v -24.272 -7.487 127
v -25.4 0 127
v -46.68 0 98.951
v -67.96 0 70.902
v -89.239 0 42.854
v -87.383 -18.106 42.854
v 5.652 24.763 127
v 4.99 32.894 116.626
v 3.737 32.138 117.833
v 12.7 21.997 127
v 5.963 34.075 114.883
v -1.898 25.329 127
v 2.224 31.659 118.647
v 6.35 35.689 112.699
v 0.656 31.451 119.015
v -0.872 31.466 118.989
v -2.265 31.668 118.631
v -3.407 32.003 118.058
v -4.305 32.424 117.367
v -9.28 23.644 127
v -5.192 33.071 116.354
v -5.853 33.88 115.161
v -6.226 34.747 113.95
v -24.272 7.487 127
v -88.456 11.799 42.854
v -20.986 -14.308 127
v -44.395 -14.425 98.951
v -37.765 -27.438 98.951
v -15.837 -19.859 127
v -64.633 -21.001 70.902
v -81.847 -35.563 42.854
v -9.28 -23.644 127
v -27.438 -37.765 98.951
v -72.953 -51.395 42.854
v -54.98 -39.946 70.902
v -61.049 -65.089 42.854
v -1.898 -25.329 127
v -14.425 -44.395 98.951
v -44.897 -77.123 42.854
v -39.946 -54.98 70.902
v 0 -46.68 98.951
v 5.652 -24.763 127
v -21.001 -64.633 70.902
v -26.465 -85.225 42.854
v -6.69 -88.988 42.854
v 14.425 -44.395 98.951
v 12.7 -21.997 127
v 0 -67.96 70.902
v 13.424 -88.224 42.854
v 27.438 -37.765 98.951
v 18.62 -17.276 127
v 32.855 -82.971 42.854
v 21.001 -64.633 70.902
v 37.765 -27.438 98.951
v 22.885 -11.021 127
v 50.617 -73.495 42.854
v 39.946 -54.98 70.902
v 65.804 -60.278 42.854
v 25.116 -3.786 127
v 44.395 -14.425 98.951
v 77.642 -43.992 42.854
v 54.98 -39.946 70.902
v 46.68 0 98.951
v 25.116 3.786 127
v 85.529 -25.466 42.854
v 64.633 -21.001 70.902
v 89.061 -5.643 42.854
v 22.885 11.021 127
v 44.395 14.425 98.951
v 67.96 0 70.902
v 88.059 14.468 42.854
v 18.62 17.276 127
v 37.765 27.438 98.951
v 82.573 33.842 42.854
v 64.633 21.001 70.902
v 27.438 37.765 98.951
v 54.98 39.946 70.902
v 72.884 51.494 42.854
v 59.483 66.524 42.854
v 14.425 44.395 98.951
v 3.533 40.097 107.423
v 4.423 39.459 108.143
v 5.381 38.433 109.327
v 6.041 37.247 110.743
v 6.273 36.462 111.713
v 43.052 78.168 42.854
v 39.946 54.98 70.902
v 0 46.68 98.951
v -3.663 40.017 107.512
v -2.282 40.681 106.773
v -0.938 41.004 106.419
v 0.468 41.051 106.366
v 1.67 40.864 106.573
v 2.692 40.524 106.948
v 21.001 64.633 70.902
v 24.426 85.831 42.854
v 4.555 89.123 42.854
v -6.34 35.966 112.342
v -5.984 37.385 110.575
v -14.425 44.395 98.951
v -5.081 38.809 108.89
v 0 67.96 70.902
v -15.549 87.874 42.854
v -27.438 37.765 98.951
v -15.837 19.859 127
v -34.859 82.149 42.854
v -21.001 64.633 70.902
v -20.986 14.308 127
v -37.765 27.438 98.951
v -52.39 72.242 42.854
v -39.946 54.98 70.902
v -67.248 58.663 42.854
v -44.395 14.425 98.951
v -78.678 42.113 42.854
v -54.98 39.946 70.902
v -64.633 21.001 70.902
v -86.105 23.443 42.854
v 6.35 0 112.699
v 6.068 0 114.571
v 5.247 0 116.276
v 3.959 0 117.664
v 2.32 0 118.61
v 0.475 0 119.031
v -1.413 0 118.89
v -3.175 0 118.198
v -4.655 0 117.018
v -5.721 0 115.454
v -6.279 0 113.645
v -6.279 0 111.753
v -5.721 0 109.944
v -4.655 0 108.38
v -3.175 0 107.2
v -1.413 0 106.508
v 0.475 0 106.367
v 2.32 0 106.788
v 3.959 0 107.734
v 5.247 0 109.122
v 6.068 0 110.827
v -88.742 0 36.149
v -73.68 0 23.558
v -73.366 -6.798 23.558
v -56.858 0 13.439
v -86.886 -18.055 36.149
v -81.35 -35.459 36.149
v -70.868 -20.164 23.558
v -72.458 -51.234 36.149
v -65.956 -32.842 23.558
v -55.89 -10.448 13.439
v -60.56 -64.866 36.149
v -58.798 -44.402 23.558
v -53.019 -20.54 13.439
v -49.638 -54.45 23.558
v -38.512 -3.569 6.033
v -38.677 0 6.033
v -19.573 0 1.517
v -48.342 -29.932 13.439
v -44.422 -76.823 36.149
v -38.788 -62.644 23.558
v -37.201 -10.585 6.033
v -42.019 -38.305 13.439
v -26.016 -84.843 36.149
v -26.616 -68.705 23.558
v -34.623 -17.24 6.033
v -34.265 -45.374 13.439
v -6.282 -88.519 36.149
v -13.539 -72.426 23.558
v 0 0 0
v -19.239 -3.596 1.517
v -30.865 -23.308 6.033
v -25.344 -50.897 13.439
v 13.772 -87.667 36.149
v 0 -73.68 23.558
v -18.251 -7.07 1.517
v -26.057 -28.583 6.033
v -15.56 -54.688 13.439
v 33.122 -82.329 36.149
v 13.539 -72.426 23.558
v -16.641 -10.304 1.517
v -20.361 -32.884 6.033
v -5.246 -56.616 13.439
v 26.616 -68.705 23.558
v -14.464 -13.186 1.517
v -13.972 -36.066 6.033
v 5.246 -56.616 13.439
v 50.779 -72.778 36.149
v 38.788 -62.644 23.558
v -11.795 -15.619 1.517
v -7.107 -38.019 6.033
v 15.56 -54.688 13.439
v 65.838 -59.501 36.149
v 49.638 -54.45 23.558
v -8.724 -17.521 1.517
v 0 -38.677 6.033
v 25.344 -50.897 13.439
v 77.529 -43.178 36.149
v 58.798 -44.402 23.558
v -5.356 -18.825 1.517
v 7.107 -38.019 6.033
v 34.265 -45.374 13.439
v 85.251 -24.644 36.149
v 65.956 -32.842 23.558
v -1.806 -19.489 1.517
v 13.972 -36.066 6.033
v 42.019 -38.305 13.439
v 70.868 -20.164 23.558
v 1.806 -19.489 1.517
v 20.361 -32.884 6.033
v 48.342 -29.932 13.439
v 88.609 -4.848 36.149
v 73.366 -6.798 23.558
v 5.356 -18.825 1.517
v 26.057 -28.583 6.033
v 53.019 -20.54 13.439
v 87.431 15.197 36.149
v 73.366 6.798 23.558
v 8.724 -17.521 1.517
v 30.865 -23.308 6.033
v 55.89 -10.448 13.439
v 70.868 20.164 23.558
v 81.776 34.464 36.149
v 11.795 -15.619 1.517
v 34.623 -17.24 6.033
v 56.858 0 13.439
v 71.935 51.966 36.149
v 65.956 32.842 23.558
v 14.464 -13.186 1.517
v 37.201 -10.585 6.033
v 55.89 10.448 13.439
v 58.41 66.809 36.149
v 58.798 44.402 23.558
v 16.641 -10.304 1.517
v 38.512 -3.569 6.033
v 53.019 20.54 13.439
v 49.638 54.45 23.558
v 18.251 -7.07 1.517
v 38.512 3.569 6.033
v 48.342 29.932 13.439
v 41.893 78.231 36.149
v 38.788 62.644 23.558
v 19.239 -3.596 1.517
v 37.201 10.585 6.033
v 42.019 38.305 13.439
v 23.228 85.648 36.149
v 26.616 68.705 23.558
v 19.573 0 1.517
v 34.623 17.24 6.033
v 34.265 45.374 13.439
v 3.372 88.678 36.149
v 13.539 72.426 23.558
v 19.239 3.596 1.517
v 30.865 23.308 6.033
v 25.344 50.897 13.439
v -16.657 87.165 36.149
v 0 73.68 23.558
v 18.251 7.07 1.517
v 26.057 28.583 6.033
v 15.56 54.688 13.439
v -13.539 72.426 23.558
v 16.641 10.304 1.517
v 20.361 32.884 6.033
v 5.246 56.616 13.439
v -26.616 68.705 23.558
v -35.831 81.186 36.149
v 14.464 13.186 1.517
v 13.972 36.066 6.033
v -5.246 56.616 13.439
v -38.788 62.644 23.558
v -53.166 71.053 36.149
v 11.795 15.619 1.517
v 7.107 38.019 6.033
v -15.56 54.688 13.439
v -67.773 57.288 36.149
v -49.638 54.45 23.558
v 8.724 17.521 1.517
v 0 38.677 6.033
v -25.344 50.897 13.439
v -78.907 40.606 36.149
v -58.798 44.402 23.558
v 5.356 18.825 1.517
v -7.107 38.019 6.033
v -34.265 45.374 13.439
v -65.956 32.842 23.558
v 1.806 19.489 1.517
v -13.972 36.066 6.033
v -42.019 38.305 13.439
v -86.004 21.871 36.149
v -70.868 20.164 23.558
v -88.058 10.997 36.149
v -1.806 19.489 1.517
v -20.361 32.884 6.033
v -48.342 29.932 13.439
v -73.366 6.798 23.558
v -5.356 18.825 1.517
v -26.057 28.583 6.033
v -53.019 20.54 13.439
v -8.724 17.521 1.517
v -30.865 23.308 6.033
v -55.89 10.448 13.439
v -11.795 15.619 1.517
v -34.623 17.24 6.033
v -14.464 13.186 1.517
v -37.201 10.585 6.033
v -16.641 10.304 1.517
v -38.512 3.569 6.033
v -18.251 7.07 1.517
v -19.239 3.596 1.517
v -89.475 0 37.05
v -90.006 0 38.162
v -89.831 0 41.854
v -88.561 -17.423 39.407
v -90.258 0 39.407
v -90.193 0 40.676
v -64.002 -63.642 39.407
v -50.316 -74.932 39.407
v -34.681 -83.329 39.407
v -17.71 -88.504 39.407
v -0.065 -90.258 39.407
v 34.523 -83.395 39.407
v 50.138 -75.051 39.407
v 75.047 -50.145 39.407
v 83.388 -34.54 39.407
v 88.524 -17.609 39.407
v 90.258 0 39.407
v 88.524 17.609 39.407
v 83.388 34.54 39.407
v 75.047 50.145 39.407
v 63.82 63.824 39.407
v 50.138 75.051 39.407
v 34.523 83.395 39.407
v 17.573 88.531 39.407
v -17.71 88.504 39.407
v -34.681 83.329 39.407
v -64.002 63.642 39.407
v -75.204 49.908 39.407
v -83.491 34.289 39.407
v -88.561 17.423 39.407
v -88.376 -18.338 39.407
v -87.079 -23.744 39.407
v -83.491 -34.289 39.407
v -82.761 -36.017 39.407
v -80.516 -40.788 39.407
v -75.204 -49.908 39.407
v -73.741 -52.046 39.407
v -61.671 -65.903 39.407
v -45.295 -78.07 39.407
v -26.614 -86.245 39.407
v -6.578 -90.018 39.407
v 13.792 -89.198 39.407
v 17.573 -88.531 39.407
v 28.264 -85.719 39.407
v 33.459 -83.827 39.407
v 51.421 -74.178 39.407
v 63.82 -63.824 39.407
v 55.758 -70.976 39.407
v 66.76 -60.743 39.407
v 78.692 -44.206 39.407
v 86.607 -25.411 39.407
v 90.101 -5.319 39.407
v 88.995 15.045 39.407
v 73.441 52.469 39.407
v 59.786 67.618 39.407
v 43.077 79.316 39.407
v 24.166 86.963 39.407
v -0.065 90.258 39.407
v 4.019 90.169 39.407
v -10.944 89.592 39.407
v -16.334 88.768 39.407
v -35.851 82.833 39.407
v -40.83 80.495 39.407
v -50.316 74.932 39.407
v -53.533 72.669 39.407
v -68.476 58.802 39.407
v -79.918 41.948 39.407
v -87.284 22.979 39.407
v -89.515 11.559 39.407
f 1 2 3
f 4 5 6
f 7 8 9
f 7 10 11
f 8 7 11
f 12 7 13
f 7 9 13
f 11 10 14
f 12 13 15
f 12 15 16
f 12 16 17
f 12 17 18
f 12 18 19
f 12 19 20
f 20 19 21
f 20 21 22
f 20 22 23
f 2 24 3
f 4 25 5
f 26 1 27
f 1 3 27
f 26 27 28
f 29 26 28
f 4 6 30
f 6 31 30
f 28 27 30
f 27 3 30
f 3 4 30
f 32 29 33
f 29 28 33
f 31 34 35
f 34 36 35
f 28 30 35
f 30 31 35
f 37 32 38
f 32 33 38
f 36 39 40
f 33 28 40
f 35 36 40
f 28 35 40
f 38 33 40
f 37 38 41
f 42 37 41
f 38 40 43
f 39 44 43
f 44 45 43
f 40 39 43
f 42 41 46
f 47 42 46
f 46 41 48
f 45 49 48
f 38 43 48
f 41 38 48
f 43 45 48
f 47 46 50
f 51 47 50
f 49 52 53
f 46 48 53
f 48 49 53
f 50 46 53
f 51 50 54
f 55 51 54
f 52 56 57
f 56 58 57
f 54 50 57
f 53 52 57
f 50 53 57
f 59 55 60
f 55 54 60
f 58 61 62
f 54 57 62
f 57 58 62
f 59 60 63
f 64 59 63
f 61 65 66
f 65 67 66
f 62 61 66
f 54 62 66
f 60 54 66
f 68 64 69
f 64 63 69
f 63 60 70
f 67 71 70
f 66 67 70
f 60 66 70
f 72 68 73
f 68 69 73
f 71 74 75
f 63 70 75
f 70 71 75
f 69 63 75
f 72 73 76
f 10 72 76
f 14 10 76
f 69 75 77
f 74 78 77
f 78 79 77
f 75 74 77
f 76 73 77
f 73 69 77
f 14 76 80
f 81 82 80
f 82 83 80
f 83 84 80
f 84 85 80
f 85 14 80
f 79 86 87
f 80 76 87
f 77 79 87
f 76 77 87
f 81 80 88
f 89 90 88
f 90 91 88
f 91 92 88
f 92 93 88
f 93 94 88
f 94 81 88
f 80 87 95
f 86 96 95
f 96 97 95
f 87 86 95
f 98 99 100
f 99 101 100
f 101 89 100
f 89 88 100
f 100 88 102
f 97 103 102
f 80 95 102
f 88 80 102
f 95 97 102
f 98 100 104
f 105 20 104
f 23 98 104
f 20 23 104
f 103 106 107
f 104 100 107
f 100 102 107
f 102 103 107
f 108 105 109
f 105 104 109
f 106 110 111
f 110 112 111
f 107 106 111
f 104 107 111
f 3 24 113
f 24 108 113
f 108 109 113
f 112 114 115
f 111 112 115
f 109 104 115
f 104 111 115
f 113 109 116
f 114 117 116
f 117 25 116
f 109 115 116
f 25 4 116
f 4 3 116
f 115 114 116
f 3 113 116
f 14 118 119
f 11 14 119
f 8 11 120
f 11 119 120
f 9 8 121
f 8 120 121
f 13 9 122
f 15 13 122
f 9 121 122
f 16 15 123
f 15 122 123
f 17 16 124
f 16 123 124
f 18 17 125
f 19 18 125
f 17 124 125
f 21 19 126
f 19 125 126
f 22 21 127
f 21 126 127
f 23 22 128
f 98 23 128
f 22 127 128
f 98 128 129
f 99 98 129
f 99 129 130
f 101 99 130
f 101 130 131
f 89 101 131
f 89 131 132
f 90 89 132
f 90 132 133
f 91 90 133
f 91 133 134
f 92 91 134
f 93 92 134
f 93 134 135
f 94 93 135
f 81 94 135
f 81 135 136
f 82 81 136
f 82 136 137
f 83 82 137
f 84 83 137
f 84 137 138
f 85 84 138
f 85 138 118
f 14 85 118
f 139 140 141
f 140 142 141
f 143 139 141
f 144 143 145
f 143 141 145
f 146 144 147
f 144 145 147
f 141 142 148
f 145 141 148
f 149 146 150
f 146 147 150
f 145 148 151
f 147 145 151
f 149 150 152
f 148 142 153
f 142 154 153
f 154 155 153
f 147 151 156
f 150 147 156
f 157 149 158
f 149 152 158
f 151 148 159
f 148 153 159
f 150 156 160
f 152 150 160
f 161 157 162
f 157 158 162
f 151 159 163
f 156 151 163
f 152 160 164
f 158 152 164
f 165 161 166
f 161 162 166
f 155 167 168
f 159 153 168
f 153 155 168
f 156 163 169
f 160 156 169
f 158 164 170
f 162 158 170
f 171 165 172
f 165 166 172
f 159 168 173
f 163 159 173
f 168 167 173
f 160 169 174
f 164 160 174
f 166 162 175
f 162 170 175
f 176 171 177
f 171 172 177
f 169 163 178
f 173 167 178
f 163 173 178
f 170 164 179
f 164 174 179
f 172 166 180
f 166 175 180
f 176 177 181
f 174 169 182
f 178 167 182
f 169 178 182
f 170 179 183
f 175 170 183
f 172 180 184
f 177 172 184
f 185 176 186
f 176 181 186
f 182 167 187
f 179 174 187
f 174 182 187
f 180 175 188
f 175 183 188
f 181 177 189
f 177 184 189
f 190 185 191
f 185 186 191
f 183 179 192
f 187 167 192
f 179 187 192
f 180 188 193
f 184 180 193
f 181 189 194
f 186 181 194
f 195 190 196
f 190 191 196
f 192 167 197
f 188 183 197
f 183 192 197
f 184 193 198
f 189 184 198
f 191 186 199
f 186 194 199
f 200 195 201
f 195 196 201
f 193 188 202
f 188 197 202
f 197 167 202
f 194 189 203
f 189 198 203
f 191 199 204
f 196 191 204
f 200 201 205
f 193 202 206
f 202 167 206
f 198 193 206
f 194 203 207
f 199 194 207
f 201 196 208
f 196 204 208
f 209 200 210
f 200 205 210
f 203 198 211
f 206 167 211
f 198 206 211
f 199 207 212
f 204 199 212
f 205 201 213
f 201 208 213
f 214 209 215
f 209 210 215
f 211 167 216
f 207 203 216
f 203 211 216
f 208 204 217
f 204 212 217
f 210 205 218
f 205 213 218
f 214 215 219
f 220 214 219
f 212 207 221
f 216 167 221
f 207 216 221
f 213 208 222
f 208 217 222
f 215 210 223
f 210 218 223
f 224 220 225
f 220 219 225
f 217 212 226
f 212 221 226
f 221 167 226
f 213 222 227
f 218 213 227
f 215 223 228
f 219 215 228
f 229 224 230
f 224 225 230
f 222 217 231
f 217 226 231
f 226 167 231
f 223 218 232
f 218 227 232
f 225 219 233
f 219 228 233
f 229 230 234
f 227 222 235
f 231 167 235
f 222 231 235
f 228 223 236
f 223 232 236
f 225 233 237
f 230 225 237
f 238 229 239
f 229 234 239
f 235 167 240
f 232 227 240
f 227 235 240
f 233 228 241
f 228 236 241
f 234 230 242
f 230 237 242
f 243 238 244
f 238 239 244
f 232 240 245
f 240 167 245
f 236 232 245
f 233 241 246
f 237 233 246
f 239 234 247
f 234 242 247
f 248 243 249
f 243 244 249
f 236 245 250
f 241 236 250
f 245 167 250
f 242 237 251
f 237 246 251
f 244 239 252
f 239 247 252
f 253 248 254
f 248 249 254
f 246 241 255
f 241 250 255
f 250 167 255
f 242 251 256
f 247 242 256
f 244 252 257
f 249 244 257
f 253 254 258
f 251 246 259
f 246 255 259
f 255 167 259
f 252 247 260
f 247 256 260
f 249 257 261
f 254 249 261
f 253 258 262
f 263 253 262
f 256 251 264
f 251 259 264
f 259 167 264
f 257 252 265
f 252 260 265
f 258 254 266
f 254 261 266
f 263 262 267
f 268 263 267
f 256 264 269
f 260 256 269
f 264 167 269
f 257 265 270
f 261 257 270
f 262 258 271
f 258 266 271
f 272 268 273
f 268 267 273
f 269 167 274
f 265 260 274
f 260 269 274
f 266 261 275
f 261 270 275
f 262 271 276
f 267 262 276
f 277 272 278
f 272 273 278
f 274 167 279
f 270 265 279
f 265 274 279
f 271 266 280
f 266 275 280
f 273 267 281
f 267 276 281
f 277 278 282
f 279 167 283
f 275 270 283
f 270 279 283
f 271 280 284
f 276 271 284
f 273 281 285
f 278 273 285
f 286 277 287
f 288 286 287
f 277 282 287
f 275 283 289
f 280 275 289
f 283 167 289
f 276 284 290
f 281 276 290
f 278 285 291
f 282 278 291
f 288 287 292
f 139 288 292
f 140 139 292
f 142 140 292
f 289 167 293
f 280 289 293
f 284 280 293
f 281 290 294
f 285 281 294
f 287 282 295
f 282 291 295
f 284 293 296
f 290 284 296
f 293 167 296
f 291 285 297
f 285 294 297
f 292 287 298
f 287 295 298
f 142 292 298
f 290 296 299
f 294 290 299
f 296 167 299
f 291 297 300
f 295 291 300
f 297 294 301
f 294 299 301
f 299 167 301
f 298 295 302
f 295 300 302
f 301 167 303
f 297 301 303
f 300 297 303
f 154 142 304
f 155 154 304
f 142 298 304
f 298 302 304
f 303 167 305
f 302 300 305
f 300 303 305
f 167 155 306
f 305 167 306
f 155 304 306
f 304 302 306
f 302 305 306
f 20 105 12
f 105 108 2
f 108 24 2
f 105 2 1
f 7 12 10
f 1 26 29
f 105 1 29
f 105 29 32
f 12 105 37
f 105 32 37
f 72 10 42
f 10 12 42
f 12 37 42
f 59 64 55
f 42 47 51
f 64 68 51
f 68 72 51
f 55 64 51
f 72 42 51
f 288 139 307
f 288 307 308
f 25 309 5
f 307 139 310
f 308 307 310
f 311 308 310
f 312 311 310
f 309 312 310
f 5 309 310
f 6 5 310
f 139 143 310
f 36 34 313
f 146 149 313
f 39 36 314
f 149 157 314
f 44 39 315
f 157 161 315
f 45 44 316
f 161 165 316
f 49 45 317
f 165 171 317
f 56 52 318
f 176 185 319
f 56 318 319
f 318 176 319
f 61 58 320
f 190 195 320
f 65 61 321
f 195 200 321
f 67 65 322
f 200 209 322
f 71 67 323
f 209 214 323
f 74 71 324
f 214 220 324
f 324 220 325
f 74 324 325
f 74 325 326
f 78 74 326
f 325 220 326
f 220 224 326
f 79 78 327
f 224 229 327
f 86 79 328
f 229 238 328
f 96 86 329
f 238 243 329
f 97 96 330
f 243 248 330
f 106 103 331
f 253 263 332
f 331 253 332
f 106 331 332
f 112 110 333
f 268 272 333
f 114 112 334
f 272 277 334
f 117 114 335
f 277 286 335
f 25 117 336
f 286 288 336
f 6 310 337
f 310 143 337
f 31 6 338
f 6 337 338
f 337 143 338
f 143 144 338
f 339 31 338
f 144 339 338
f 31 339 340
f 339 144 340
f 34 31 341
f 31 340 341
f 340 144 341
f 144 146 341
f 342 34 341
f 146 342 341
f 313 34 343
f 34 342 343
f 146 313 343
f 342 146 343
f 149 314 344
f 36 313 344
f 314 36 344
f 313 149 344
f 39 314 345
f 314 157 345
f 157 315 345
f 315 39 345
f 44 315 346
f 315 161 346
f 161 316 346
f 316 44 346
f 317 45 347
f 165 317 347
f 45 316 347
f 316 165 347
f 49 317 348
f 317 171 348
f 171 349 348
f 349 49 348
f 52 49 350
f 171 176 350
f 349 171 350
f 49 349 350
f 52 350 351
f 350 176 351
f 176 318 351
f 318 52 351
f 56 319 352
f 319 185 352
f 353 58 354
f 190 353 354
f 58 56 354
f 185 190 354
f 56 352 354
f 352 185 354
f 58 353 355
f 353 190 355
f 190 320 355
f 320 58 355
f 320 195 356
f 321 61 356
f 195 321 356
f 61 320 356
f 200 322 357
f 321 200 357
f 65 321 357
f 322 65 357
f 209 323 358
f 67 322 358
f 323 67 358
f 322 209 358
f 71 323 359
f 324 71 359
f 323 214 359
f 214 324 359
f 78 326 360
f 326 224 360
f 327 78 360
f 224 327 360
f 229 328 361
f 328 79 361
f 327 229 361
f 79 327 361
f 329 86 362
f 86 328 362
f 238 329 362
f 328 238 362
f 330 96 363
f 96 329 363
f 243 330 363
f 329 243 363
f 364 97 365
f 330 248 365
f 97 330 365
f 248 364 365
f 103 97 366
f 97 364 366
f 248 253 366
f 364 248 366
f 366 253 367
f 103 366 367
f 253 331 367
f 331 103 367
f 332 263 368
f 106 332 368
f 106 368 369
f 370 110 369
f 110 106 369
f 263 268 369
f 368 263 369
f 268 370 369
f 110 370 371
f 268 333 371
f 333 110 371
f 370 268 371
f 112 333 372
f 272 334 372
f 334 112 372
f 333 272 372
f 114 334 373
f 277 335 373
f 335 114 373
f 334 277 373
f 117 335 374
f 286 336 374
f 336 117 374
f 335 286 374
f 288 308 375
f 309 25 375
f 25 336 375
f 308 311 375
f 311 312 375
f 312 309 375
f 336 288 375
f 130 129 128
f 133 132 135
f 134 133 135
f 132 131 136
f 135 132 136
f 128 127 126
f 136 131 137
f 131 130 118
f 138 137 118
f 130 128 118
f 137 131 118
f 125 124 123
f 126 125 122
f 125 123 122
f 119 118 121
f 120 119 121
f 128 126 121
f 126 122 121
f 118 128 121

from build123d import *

# Parameters (mm, degrees)
F2_R     = 5.08
F4_D     = 12.7
F4_DEPTH = 90.273154499


with BuildPart() as f1:
    # F0 (on Front) → F1 (revolve)
    with BuildSketch(Plane.XZ):
        with BuildLine():
            ThreePointArc((-91.9005685167, 39.3456475336), (-49.9844837763, 10.2500476162), (0, 0))
            Line((0, 0), (0, 127))
            Line((0, 127), (-25.4, 127))
            Line((-25.4, 127), (-91.9005685167, 39.3456475336))
        make_face()
    revolve(axis=Axis((0, 0, 63.5), (0, 0, 1)))

    # F2
    f2_edges = [f1.edges().sort_by_distance(p)[0] for p in [
        (91.900569, 0, 39.345648),
    ]]
    fillet(f2_edges, radius=F2_R)

    # F4 (through all, one way)
    with BuildSketch(Plane.XZ):
        with Locations((0, 112.6990020275)):
            Circle(F4_D / 2)
    extrude(amount=-F4_DEPTH, mode=Mode.SUBTRACT)


solid = f1.part
